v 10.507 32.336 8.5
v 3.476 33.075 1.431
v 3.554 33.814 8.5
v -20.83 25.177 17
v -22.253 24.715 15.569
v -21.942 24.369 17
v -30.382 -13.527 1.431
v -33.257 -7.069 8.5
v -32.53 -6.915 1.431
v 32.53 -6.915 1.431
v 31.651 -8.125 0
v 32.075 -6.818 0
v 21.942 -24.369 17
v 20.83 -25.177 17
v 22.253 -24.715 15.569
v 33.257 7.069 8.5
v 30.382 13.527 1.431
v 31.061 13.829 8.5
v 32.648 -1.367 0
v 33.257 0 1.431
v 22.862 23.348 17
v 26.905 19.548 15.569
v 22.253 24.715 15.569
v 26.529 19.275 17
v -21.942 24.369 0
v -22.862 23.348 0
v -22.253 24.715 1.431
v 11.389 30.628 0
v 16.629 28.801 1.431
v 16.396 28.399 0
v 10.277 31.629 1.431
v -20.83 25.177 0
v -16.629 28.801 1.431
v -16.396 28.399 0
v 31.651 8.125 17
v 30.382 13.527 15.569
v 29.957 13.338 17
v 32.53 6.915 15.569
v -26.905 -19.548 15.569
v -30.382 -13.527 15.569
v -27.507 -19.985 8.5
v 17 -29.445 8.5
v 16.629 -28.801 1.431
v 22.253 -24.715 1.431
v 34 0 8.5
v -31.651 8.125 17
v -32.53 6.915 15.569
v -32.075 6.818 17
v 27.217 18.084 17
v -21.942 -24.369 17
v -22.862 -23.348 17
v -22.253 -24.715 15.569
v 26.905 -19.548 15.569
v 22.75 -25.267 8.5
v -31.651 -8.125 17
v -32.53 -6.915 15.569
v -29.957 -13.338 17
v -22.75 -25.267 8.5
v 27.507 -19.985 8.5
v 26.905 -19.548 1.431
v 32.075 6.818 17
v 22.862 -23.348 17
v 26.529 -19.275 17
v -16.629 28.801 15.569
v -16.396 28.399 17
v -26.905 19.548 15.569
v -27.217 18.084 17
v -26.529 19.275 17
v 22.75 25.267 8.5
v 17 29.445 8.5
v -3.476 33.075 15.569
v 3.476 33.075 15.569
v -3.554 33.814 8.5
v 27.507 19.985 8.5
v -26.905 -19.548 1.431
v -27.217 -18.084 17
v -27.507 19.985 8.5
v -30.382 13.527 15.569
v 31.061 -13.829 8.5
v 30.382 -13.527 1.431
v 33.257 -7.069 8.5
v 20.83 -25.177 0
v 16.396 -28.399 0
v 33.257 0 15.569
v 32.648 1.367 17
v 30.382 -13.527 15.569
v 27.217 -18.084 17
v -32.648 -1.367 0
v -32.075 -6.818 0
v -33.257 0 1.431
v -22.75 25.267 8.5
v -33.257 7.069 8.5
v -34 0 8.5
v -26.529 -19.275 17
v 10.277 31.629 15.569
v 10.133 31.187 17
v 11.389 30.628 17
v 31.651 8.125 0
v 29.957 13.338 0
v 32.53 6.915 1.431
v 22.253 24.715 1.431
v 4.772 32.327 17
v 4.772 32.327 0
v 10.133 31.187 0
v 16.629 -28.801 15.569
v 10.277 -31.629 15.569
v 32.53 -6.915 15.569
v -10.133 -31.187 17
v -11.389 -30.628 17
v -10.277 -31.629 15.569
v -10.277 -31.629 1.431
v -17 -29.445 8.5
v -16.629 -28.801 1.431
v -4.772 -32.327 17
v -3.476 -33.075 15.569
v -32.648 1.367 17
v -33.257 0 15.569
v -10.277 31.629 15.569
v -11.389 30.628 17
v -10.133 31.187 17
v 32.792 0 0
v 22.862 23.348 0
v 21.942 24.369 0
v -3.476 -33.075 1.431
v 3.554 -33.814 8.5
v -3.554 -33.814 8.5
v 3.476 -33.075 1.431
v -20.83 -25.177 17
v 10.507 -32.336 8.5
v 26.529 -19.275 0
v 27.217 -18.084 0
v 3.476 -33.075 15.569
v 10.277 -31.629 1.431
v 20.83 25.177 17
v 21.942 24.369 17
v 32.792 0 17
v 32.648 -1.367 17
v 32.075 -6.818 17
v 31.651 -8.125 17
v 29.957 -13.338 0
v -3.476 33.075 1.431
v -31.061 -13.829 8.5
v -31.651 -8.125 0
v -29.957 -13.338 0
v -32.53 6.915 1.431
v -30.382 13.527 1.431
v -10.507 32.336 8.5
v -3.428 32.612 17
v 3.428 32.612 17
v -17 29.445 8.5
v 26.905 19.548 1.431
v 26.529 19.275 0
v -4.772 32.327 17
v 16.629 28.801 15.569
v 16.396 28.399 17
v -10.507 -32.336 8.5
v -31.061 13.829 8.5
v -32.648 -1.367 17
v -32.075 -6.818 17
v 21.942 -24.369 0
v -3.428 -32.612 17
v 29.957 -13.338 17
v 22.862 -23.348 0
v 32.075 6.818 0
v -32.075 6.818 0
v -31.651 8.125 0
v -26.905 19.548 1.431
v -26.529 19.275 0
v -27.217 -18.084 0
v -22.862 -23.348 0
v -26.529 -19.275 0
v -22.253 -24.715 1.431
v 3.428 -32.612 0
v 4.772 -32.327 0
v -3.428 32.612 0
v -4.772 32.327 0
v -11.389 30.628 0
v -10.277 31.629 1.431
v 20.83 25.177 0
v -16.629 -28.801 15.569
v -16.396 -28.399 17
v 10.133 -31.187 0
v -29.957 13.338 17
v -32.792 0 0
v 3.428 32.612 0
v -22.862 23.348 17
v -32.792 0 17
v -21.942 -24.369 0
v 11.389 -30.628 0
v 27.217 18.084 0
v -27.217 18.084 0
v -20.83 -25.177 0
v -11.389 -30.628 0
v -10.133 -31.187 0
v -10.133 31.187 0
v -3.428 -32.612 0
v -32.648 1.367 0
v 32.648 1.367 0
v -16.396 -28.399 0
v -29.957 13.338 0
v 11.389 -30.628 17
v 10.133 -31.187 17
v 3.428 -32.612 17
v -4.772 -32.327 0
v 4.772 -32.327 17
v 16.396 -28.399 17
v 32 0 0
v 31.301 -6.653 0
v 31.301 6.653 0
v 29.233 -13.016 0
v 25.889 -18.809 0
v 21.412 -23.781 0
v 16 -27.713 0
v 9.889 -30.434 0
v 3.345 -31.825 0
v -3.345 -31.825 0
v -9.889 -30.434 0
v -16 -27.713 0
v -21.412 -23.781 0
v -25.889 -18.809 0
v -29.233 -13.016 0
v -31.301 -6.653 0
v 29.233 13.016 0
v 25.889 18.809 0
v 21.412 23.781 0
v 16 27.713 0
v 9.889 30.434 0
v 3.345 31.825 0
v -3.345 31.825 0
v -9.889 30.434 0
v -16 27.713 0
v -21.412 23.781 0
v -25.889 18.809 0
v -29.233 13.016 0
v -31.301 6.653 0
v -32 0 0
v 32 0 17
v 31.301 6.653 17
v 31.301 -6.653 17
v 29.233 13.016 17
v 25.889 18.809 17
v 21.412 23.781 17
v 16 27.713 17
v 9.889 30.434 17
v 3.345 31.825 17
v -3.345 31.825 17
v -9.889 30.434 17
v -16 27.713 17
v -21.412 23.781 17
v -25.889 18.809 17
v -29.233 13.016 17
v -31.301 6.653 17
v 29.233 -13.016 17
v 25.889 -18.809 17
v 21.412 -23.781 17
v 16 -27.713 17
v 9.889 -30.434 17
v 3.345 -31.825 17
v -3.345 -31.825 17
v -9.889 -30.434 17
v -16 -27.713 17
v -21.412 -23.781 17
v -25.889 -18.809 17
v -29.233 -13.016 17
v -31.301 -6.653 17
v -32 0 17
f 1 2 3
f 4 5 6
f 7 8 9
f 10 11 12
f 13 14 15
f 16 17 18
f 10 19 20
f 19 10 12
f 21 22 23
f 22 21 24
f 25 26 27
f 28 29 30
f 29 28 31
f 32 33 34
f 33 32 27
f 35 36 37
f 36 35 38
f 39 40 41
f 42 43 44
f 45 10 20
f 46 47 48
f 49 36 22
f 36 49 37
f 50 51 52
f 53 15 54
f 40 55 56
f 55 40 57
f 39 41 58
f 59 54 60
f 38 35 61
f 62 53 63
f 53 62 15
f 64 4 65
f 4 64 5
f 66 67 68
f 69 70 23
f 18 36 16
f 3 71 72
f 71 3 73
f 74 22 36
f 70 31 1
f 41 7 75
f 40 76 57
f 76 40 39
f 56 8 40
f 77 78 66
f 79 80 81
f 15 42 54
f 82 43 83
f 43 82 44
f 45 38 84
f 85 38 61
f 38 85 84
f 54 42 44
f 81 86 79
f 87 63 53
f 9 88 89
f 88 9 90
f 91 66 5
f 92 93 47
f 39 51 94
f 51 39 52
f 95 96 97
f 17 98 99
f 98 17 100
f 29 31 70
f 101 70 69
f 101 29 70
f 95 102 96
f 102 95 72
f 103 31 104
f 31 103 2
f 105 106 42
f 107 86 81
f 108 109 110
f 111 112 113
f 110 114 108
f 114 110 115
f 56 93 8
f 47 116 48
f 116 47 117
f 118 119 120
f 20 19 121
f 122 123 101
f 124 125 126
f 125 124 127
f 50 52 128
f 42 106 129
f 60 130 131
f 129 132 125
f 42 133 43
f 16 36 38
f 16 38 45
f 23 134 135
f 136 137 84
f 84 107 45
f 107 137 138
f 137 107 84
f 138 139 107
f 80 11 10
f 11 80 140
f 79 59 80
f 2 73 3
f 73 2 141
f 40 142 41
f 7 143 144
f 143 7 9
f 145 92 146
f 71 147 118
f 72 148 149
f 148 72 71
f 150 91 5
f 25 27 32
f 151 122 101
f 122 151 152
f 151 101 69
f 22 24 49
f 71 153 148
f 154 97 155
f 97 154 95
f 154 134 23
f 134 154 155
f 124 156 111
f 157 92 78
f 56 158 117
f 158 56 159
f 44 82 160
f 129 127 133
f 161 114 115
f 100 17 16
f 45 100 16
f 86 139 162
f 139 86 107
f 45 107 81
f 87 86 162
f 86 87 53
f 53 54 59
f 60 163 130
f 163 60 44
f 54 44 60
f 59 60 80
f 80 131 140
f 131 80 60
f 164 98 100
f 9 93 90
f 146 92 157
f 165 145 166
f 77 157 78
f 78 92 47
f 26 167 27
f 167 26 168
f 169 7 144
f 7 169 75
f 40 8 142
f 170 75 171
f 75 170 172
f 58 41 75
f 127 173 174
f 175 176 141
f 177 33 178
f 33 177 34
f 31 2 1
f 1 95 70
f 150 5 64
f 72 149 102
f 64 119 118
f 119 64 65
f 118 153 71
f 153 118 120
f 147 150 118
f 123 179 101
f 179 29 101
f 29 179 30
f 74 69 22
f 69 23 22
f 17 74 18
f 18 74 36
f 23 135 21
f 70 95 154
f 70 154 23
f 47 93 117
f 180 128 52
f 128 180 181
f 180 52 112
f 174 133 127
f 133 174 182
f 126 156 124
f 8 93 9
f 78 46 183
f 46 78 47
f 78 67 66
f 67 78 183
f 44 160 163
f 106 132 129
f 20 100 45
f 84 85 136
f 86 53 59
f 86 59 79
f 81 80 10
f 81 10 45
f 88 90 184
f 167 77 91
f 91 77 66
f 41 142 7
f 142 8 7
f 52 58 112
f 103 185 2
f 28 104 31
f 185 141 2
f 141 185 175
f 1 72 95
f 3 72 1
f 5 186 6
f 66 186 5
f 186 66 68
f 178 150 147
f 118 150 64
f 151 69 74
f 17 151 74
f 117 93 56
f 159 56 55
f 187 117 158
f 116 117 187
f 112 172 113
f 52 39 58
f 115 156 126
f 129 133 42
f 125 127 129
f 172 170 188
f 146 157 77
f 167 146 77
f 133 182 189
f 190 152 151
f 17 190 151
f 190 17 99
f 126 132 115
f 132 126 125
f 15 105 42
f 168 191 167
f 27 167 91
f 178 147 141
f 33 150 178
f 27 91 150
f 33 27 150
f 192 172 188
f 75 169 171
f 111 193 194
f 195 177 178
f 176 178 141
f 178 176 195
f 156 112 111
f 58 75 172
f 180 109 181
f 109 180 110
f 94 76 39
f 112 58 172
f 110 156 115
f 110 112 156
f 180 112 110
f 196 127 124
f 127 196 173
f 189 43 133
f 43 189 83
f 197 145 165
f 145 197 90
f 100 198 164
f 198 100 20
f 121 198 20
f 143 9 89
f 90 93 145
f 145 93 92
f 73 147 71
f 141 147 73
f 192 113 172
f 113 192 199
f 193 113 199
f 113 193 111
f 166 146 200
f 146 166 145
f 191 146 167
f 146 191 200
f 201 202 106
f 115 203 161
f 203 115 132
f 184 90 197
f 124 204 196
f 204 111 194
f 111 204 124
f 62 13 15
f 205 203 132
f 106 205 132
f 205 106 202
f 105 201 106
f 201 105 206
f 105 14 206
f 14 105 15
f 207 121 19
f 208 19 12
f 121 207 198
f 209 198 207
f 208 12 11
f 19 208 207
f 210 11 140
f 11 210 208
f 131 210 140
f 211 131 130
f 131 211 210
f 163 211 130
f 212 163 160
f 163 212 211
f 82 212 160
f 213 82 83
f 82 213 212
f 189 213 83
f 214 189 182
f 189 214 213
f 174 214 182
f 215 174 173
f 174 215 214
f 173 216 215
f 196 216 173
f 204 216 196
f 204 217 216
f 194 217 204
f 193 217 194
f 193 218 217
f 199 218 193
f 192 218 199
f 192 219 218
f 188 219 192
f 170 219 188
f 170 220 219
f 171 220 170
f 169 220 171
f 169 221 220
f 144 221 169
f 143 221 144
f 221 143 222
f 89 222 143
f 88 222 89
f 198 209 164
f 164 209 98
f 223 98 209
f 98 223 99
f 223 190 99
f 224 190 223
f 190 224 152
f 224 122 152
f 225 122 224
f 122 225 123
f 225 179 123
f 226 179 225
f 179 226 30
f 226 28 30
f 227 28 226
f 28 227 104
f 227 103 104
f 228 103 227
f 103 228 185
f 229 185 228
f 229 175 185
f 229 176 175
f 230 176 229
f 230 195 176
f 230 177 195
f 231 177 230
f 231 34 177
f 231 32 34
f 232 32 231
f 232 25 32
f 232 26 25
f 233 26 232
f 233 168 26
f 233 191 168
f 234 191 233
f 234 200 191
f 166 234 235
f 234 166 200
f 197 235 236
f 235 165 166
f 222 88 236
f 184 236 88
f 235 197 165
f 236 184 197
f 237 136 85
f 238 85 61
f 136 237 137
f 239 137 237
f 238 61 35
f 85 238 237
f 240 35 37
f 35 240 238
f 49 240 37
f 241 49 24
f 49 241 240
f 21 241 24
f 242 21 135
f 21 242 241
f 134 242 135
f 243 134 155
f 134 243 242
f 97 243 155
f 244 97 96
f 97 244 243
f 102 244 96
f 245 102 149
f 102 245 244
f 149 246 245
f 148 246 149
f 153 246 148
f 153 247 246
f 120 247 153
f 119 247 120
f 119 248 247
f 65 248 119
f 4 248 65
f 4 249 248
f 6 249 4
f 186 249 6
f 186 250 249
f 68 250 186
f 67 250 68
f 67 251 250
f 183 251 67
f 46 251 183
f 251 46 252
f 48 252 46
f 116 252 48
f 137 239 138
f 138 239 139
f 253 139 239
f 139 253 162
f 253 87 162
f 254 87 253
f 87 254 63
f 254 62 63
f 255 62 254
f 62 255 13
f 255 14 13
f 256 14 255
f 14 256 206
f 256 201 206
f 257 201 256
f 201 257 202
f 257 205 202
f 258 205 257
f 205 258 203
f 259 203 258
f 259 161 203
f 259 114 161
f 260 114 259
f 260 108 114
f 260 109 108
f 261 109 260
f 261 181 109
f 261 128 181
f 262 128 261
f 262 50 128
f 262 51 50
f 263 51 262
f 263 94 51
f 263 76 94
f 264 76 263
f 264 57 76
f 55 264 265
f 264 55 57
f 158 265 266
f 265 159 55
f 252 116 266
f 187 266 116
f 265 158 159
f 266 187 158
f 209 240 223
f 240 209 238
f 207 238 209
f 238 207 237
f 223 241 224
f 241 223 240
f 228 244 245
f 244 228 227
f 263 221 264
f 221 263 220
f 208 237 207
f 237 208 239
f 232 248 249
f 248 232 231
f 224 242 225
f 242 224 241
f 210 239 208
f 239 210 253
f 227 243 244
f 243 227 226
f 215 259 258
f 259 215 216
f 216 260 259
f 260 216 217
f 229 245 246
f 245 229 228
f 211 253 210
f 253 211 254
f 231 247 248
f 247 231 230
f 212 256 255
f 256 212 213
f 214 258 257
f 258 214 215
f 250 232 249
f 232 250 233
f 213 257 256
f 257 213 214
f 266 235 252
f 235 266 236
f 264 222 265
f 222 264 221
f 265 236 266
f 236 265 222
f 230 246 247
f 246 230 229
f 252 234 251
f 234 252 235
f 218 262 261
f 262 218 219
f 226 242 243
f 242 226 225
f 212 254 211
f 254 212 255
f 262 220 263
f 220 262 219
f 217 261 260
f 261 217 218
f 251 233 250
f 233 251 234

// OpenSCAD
espessura=2;
raio = 32+espessura;

difference(){
	translate ([0,0,raio/4]) sphere(r=raio);
	translate([-raio, -raio, -raio]) cube([2*raio, 2*raio, raio]);
   translate ([-raio, -raio, raio/2]) cube ([2*raio, 2*raio, raio]);
   translate ([0, 0, -0.1]) cylinder (r=raio -espessura, h=raio);
   
}
